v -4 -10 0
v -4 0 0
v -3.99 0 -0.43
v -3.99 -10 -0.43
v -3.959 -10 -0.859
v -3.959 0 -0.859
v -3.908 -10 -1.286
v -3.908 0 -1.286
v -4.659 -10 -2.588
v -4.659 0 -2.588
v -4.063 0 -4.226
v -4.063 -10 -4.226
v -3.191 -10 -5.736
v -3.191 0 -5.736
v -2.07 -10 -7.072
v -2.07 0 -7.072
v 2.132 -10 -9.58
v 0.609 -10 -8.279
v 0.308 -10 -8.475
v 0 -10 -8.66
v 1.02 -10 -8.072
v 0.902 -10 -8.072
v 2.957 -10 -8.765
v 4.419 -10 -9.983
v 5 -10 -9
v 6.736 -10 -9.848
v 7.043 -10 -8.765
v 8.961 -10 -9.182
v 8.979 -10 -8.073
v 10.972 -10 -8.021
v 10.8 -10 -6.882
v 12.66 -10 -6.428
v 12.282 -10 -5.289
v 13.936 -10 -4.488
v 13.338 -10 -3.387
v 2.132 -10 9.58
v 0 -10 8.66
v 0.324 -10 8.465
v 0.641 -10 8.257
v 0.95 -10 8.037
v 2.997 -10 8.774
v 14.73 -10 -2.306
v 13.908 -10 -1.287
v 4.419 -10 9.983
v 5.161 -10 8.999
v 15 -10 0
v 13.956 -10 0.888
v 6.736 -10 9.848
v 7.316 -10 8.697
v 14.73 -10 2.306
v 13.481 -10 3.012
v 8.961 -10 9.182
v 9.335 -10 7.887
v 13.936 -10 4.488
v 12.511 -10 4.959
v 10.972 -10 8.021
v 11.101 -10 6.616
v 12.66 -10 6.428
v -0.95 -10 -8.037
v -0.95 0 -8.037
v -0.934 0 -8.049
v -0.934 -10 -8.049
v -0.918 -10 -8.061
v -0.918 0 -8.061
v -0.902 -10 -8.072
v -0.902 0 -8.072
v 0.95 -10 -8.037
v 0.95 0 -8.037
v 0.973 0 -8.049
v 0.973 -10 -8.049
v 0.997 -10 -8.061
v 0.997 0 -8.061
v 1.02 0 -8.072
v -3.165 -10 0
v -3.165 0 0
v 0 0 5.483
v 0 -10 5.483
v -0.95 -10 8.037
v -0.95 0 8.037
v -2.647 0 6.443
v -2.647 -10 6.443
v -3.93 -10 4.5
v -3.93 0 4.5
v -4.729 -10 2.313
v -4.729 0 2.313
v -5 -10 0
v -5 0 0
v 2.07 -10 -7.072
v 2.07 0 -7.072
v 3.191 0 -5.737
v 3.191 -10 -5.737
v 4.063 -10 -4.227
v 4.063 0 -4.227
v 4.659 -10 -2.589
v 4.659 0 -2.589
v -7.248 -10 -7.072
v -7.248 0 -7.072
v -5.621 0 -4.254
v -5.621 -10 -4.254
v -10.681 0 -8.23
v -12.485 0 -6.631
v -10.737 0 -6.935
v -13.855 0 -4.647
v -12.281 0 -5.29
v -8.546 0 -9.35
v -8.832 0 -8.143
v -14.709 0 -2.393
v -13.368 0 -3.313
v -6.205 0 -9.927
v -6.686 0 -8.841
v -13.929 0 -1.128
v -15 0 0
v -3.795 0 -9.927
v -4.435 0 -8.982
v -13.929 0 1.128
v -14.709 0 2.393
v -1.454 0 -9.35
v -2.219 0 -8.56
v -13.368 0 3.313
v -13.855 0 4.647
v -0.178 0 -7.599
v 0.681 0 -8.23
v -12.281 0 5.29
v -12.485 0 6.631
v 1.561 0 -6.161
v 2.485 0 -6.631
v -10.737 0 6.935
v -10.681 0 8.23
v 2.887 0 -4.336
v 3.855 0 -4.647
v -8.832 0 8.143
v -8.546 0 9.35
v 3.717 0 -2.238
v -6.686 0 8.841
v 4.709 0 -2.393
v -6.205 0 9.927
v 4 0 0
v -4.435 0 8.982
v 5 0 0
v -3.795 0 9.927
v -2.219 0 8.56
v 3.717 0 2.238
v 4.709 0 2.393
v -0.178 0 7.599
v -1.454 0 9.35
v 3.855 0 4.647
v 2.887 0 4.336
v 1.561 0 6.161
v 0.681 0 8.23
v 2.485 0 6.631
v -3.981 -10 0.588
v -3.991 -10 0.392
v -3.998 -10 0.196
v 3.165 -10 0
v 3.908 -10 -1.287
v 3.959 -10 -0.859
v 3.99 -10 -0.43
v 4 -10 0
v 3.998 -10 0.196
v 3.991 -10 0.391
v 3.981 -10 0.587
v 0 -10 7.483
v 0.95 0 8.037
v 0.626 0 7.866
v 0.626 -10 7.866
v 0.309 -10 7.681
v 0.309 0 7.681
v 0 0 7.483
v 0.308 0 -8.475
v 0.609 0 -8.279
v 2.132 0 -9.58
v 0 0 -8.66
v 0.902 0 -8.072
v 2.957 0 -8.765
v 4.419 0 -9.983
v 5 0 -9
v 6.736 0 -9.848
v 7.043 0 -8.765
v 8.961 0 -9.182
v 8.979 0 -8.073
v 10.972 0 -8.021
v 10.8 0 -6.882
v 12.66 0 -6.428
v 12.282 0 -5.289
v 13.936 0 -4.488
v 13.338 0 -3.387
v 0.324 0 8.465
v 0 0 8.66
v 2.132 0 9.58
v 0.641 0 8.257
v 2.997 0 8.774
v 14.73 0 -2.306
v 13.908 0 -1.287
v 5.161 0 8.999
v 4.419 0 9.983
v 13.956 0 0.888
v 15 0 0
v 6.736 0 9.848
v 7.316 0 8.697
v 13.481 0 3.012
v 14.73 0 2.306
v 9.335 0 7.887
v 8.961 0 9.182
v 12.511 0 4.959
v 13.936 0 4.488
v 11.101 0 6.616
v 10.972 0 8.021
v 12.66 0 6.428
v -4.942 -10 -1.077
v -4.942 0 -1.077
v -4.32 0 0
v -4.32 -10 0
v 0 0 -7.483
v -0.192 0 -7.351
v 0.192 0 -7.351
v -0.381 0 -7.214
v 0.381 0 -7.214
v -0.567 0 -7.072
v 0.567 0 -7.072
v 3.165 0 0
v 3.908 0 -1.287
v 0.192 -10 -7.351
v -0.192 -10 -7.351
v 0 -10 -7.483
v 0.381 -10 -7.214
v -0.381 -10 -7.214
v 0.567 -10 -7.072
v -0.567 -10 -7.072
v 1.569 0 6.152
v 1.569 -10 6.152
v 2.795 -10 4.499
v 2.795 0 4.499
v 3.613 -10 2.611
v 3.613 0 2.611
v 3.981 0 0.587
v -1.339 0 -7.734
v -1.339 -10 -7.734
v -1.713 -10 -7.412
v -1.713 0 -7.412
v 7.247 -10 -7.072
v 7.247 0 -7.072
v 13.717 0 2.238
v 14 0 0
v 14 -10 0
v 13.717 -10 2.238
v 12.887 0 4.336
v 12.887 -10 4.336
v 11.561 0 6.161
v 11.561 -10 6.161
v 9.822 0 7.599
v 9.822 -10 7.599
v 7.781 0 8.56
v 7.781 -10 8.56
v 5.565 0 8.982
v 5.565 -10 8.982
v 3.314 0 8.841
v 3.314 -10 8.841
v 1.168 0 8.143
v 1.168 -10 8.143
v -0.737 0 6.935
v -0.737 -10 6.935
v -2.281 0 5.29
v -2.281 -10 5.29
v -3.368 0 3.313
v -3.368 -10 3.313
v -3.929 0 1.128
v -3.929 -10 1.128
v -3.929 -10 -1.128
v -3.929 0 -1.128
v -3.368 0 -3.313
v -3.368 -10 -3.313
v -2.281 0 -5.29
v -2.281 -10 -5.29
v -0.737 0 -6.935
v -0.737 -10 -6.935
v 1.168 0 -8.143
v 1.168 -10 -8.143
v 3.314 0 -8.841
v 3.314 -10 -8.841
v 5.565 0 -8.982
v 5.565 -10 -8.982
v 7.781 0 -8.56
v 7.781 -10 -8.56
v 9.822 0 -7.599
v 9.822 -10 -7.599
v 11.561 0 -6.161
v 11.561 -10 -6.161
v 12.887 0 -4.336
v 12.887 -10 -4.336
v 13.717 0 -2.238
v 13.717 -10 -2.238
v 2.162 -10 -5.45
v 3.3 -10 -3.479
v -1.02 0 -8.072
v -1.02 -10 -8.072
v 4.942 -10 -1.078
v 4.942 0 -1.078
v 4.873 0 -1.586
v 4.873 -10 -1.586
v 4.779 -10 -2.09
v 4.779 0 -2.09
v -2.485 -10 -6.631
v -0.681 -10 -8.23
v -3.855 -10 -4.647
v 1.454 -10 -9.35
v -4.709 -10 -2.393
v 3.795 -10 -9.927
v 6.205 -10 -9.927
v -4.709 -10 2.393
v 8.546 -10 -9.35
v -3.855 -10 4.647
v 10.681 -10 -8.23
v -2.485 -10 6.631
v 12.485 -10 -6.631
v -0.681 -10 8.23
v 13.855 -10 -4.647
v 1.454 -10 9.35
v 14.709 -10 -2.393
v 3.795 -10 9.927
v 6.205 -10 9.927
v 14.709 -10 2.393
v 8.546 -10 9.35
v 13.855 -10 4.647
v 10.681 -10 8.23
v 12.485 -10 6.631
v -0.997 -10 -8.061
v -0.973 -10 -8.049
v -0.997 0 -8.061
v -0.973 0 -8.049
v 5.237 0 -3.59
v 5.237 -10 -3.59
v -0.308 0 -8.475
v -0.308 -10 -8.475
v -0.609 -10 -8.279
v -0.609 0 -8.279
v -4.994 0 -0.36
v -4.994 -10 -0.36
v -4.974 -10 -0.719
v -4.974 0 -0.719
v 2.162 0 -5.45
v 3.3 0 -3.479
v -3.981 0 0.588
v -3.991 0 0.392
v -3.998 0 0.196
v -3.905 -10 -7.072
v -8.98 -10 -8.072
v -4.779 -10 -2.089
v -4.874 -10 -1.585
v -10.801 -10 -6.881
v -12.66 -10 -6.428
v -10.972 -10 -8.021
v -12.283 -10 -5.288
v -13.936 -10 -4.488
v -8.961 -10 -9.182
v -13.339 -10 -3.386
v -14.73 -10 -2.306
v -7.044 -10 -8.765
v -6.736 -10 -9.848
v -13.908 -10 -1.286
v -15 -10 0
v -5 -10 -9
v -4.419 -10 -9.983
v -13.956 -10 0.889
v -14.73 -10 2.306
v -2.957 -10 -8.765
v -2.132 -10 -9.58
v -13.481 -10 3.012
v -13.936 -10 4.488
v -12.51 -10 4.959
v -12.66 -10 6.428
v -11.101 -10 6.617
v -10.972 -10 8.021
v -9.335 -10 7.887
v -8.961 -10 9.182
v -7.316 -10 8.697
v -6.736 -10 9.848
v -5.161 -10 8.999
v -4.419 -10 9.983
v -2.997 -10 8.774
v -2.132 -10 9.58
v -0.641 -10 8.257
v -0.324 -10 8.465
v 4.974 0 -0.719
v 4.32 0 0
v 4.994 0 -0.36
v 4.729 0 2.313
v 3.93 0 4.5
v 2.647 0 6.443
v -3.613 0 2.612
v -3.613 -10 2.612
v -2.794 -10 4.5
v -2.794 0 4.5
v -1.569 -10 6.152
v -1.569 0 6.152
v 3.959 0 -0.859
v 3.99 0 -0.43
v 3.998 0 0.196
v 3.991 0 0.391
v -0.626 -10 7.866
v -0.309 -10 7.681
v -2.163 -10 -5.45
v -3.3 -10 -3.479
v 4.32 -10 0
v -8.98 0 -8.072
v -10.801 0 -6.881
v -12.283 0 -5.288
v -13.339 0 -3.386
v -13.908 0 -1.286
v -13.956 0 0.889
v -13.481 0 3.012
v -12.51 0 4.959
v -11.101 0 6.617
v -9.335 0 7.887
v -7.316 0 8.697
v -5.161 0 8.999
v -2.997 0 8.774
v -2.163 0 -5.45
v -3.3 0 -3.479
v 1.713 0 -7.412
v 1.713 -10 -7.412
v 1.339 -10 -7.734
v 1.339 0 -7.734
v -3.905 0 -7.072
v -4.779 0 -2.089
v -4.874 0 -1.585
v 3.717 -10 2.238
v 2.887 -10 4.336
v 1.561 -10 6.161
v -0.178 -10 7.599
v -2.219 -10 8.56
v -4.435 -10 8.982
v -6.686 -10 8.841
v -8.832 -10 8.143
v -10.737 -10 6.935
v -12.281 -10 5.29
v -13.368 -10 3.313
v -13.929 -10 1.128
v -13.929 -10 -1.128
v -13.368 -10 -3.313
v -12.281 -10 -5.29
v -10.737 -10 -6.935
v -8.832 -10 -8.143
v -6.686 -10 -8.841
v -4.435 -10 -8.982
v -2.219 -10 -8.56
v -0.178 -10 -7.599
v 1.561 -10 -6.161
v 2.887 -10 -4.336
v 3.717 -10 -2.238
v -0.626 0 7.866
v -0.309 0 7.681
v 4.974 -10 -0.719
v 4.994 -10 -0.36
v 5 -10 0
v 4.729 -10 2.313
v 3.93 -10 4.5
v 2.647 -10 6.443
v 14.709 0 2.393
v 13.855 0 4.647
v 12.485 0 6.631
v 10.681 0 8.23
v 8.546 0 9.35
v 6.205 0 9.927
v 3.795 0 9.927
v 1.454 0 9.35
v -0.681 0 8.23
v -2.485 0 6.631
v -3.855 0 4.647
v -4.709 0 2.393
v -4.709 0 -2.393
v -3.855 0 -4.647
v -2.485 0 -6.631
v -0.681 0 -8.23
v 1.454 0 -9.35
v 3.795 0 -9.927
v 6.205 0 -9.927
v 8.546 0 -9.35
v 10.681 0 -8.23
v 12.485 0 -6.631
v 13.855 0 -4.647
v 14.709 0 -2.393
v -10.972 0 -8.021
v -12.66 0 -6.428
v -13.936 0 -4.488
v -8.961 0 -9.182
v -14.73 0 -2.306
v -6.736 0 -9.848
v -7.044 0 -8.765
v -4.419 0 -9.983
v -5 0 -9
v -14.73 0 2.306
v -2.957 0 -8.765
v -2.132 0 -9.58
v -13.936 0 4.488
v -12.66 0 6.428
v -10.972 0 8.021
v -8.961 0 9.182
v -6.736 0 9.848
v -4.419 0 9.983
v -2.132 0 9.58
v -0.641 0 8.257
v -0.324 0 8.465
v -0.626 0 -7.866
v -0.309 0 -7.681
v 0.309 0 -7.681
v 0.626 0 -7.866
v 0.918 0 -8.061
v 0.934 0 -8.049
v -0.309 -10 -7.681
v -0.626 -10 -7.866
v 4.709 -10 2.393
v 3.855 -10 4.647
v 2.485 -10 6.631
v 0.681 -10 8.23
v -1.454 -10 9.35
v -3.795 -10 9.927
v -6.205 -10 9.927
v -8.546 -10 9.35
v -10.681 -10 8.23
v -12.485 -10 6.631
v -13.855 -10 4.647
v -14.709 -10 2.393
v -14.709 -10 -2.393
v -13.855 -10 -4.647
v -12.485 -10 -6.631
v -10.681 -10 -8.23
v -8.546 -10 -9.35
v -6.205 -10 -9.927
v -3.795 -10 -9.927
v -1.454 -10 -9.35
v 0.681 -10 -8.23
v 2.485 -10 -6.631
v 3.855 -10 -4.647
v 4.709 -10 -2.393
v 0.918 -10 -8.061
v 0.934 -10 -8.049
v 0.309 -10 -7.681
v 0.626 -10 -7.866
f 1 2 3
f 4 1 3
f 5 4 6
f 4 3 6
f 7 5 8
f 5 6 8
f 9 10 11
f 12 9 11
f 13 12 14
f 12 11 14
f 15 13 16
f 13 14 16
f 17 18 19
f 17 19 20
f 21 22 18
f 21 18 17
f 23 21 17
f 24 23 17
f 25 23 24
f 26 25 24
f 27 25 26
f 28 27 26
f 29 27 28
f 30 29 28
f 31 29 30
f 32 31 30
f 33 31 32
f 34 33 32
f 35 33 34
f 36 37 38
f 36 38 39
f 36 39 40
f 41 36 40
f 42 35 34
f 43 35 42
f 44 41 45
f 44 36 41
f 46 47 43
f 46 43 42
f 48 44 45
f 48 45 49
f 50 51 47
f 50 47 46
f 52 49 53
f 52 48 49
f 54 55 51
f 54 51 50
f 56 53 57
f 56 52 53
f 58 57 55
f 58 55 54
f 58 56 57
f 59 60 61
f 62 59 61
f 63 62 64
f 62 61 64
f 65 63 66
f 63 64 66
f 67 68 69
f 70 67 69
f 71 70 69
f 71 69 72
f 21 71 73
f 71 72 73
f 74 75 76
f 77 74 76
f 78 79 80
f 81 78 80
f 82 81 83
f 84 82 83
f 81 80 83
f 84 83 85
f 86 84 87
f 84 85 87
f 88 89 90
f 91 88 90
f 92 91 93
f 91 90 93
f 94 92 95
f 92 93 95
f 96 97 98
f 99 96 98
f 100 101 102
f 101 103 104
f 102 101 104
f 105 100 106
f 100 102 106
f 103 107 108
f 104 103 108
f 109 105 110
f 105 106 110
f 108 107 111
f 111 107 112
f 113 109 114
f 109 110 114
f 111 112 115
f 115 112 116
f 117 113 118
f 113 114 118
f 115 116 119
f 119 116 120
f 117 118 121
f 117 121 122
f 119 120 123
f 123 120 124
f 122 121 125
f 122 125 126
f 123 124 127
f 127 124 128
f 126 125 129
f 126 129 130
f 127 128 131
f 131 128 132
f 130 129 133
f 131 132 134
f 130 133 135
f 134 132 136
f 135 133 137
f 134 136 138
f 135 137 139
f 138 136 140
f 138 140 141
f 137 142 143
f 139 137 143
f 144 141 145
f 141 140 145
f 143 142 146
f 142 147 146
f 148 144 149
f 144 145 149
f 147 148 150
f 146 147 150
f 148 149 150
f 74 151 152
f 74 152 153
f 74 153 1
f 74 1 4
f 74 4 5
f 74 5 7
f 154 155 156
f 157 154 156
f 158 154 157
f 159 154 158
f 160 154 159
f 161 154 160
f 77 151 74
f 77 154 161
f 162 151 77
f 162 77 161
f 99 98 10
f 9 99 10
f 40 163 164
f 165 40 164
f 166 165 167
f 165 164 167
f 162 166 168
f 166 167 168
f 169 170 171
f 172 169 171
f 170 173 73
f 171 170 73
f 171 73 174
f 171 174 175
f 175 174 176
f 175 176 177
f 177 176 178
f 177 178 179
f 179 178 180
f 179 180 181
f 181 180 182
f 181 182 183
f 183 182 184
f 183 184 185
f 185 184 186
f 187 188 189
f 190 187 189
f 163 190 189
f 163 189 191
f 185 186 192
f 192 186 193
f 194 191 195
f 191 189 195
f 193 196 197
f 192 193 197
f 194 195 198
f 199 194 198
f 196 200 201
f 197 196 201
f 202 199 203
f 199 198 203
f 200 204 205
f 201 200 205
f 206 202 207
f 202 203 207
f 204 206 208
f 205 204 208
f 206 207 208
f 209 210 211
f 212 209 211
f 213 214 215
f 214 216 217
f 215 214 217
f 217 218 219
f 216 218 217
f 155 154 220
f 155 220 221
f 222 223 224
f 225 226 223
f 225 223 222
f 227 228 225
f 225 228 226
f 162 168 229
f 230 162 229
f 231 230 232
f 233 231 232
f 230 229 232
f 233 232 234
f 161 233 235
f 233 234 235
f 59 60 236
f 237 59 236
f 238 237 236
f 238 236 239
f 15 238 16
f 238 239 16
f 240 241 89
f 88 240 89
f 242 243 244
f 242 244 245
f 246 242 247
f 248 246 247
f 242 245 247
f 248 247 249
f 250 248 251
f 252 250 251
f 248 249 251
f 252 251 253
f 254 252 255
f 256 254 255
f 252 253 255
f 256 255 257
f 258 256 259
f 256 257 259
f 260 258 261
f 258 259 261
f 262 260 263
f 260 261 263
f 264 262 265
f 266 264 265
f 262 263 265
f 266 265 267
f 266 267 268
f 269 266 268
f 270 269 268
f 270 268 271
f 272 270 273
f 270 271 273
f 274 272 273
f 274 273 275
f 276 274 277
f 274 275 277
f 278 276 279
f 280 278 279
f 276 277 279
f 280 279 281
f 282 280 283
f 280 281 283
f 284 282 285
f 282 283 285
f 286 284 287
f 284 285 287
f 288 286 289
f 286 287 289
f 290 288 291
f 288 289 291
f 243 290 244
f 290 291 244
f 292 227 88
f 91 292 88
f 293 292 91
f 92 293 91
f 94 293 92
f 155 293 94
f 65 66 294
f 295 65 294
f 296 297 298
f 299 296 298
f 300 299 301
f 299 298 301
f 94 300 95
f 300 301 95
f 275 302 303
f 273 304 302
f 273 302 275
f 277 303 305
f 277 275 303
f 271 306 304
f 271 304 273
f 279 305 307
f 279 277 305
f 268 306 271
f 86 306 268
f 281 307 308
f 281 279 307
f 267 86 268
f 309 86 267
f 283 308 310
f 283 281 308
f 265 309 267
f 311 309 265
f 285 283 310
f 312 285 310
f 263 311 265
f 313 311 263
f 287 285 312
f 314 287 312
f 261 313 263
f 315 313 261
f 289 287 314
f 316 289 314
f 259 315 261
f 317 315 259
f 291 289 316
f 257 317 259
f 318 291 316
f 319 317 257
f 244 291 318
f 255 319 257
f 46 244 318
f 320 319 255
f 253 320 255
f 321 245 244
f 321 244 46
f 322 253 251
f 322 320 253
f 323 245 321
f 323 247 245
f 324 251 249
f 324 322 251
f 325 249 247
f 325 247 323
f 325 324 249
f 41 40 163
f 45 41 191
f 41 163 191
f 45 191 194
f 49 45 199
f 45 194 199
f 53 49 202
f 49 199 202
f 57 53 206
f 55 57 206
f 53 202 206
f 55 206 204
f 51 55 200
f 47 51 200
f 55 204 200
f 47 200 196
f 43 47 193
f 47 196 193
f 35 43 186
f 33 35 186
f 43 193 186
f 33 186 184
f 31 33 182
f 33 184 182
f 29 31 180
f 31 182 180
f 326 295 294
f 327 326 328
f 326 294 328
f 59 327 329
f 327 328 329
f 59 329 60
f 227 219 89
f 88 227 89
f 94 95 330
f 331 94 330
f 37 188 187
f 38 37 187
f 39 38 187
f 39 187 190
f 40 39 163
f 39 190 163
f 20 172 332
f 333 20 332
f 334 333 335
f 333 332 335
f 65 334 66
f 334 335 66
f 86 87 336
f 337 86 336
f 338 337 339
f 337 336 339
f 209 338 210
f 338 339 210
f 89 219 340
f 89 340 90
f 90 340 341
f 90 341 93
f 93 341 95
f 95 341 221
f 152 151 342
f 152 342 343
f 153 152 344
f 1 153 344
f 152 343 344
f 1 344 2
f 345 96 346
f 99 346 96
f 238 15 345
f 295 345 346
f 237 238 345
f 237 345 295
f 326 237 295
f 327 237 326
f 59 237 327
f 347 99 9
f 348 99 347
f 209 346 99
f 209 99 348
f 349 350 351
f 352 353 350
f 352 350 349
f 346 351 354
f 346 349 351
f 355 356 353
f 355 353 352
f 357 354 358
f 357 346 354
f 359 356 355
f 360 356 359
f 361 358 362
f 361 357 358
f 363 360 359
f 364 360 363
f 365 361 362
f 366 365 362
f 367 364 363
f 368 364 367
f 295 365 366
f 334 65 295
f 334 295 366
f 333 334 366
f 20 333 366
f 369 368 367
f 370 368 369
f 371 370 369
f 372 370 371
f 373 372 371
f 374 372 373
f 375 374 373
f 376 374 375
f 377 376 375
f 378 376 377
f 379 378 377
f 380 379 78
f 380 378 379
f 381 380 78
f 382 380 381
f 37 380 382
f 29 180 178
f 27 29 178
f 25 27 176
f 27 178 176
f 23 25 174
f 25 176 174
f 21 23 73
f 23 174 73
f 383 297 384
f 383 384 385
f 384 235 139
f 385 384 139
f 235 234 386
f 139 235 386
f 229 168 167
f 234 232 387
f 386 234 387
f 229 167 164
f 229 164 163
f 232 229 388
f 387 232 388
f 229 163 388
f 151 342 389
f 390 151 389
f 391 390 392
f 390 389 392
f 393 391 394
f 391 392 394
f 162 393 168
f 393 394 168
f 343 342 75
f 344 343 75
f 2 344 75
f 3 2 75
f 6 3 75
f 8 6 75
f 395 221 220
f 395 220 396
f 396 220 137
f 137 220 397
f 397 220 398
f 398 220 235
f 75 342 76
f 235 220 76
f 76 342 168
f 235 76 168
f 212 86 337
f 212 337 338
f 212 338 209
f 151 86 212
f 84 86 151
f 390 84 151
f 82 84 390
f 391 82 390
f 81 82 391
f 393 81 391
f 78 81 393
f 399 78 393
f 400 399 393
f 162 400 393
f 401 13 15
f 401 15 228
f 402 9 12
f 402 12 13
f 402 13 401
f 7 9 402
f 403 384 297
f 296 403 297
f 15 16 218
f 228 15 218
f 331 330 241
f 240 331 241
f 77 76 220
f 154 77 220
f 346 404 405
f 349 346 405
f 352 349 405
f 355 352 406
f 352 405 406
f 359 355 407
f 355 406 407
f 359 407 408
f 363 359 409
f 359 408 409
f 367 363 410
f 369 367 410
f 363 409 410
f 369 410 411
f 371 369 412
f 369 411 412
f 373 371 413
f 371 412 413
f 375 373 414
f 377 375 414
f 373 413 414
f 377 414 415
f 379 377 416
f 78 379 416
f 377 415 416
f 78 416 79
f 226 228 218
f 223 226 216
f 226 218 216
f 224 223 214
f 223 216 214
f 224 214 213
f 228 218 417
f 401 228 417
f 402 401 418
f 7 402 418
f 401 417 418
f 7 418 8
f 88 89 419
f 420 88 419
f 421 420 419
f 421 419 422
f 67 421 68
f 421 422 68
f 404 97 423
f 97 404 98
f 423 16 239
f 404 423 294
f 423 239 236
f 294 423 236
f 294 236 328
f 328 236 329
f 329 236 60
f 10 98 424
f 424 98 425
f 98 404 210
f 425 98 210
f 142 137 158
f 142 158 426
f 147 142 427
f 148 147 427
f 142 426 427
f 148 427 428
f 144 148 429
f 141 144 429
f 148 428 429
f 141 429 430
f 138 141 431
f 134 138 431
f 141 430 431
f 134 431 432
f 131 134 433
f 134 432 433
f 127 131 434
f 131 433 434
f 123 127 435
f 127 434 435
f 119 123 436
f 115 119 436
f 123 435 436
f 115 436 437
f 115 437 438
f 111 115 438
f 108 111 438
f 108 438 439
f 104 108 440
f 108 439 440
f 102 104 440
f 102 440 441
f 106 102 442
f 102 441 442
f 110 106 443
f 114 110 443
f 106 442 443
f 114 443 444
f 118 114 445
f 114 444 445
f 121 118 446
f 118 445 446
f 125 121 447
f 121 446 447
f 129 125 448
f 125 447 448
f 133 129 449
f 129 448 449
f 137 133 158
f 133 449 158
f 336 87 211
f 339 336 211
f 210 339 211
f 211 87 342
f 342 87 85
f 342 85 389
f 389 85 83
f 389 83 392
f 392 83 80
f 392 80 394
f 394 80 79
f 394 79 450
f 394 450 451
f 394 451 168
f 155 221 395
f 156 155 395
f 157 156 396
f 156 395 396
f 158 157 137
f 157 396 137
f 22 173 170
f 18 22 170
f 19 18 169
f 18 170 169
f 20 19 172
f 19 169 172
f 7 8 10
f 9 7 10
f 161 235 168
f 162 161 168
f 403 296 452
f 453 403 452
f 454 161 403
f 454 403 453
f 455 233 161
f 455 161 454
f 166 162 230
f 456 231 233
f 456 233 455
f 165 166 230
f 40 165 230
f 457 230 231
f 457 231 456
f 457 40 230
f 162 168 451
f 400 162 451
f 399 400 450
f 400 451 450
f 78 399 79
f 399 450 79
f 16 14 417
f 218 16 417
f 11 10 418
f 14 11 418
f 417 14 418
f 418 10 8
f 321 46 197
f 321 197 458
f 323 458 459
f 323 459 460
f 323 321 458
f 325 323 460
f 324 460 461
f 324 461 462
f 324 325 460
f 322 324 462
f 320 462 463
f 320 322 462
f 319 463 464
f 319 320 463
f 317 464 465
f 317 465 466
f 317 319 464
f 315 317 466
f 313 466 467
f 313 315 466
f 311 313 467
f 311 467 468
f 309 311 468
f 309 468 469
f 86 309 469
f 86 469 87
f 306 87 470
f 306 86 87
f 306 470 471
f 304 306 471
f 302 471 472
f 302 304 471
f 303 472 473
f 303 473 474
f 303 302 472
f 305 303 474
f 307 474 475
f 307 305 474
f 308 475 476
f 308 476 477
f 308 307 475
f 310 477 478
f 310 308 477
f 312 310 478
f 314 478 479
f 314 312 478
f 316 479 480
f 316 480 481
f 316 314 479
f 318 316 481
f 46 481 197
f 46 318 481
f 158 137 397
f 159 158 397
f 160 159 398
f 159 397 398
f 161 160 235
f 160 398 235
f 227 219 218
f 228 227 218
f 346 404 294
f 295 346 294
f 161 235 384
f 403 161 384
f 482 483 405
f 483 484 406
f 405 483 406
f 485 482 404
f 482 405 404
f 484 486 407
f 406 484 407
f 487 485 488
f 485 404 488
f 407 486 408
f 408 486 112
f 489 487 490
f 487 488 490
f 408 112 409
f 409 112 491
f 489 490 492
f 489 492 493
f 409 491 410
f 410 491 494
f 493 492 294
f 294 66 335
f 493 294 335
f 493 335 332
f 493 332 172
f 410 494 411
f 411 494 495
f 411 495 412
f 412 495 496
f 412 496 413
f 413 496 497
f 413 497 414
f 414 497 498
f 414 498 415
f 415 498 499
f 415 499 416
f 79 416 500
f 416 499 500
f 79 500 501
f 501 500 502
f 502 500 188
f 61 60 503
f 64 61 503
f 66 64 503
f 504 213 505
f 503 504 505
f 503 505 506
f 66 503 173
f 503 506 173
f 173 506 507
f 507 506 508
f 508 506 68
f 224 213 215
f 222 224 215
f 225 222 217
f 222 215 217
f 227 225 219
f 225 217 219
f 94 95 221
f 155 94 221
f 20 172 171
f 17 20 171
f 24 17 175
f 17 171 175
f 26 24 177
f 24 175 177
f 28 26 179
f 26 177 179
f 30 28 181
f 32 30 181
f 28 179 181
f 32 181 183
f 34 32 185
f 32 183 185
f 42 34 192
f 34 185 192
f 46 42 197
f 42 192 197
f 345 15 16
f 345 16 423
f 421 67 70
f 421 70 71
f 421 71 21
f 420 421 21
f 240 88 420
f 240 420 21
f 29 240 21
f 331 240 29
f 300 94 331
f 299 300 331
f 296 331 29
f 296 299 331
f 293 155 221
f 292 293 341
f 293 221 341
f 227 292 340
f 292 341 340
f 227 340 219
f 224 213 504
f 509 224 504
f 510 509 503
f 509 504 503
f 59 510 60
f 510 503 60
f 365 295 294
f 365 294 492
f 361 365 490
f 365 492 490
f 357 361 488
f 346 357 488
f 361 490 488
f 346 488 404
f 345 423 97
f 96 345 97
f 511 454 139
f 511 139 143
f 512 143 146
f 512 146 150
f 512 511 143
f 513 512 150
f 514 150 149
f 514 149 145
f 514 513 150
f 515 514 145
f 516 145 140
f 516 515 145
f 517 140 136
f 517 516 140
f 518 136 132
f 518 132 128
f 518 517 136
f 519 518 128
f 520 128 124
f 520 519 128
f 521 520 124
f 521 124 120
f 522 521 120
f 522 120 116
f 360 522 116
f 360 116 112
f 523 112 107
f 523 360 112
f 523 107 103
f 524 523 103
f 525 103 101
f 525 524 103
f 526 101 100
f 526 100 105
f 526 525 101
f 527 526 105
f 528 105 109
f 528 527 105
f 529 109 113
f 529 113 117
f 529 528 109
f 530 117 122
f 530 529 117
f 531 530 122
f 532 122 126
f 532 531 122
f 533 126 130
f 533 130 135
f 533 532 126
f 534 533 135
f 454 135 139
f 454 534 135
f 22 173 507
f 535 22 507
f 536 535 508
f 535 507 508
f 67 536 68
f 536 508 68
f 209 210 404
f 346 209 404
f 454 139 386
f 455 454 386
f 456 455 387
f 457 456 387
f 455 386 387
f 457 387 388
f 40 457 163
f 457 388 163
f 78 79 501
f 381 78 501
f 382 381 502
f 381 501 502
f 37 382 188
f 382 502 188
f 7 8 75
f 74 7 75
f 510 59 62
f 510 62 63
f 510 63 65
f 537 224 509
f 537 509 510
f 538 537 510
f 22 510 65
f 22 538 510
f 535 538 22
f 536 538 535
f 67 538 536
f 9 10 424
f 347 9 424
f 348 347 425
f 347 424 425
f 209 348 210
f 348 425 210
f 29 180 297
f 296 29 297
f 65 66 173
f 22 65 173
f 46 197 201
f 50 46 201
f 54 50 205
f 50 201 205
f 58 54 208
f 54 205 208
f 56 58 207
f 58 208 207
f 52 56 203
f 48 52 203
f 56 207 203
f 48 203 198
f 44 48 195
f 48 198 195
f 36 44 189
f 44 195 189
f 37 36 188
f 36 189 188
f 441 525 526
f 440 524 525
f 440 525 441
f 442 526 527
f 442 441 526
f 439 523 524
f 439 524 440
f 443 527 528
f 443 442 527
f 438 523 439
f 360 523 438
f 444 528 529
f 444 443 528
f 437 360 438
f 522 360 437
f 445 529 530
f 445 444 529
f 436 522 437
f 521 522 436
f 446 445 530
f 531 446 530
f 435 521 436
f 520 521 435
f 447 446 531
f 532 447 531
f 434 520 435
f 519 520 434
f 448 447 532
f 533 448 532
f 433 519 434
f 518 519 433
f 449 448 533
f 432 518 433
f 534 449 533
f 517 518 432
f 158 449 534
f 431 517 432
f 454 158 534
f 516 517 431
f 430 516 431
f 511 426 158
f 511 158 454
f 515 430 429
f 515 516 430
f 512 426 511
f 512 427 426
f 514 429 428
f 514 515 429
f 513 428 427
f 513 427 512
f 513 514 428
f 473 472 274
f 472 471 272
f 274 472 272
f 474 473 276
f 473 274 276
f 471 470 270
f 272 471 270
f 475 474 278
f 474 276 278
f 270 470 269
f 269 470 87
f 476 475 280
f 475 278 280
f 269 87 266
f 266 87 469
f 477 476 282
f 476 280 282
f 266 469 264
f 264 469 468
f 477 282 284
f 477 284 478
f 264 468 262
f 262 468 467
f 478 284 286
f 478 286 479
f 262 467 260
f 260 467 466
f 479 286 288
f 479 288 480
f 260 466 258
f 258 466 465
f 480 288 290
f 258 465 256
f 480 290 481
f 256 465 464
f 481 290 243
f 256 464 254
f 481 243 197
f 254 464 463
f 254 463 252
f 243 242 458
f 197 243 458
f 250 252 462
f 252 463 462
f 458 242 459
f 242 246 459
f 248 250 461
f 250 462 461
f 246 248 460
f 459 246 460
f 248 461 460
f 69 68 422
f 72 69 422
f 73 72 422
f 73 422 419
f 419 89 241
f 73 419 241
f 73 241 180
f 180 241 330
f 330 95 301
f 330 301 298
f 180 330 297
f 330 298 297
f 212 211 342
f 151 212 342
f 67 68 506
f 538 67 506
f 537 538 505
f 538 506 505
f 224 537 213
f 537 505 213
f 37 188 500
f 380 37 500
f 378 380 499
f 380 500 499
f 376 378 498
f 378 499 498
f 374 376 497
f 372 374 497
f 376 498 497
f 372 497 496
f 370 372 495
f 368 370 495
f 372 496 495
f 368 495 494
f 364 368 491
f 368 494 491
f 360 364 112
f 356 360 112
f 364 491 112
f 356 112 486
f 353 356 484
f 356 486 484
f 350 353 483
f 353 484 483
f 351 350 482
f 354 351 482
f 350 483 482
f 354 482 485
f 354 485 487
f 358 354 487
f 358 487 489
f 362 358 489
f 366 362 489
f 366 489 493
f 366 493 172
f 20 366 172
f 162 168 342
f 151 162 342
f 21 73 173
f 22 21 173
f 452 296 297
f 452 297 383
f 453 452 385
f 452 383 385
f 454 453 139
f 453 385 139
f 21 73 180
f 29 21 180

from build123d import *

# Parameters (mm, degrees)
F1_DEPTH = 10
F2_R     = 10
F2_R_2   = 9
F3_DEPTH = 10
F4_R     = 10
F4_R_2   = 9
F5_DEPTH = 10


with BuildPart() as f1:
    # F0 (on Front) → F1 (new body)
    with BuildSketch(Plane.XZ):
        with BuildLine():
            ThreePointArc((0, 8.6602540378), (0.4838541491, 8.3622570919), (0.95, 8.0372569948))
            ThreePointArc((0.95, 8.0372569948), (9.7196398168, 7.6632238647), (14, 0))
            ThreePointArc((14, 0), (12.6424014311, -4.7532831144), (8.9791776966, -8.0725550391))
            ThreePointArc((8.9791776966, -8.0725550391), (4.9997397328, -8.9999999962), (1.0203554164, -8.0723248813))
            Line((1.0203554164, -8.0723248813), (0.9023407315, -8.0723214684))
            ThreePointArc((0.9023407315, -8.0723214684), (0.4590909988, -8.3784440958), (0, -8.6602540378))
            ThreePointArc((0, -8.6602540378), (10, -8.6602540378), (15, 0))
            ThreePointArc((15, 0), (10, 8.6602540378), (0, 8.6602540378))
        make_face()
    extrude(amount=F1_DEPTH)


with BuildPart() as f1b:
    # F0 (on Front) → F1, piece 2 (new body)
    with BuildSketch(Plane.XZ):
        with BuildLine():
            ThreePointArc((-8.9802311497, -8.0720356785), (-13.054721878, 4.015153231), (-0.95, 8.0372569948))
            ThreePointArc((-0.95, 8.0372569948), (-0.4838541491, 8.3622570919), (0, 8.6602540378))
            ThreePointArc((0, 8.6602540378), (-15, 0), (0, -8.6602540378))
            ThreePointArc((0, -8.6602540378), (-0.4591280413, -8.3784199602), (-0.9024121095, -8.0722692775))
            Line((-0.9024121095, -8.0722692775), (-1.0202357206, -8.0722658703))
            ThreePointArc((-1.0202357206, -8.0722658703), (-5.0002602672, -8.9999999962), (-8.9802311497, -8.0720356785))
        make_face()
    extrude(amount=F1_DEPTH)


with BuildPart() as f1c:
    # F0 (on Front) → F1, piece 3 (new body)
    with BuildSketch(Plane.XZ):
        with BuildLine():
            Line((-5.6211760394, -4.2536667951), (-4.6593928686, -2.5876880434))
            ThreePointArc((-4.6593928686, -2.5876880434), (-4.8296923359, -1.8377019841), (-4.9418510408, -1.0768462669))
            Line((-4.9418510408, -1.0768462669), (-8.9802311497, -8.0720356785))
            Line((-8.9802311497, -8.0720356785), (-1.0202357206, -8.0722658703))
            ThreePointArc((-1.0202357206, -8.0722658703), (-0.9850797018, -8.0548379871), (-0.95, -8.0372569948))
            ThreePointArc((-0.95, -8.0372569948), (-1.5280203219, -7.5752855178), (-2.0702980916, -7.0718374484))
            Line((-2.0702980916, -7.0718374484), (-3.9045057144, -7.0717844057))
            Line((-3.9045057144, -7.0717844057), (-7.2480984047, -7.0717844057))
            Line((-7.2480984047, -7.0717844057), (-5.6211760394, -4.2536667951))
        make_face()
    extrude(amount=F1_DEPTH)


with BuildPart() as f1d:
    # F0 (on Front) → F1, piece 4 (new body)
    with BuildSketch(Plane.XZ):
        with BuildLine():
            Line((-4, 0), (-3.1654993788, 0))
            Line((-3.1654993788, 0), (-6.52584e-05, 5.4830923897))
            Line((-6.52584e-05, 5.4830923897), (3.1648918599, 0))
            Line((3.1648918599, 0), (4, 0))
            ThreePointArc((4, 0), (3.9952123452, 0.2935214892), (3.9808544745, 0.5867306941))
            Line((3.9808544745, 0.5867306941), (0, 7.4833147735))
            Line((0, 7.4833147735), (-3.9807778283, 0.5879027113))
            ThreePointArc((-3.9807778283, 0.5879027113), (-3.9951931734, 0.2941084365), (-4, 0))
        make_face()
        with BuildLine():
            Line((-3.9077024465, -1.2856271329), (-3.1654993788, 0))
            Line((-3.1654993788, 0), (-4, 0))
            ThreePointArc((-4, 0), (-3.9768959562, -0.6444679905), (-3.9077024465, -1.2856271329))
        make_face()
        with BuildLine():
            Line((4, 0), (3.1648918599, 0))
            Line((3.1648918599, 0), (3.9075585107, -1.2866240234))
            ThreePointArc((3.9075585107, -1.2866240234), (3.9768598796, -0.6449703107), (4, 0))
        make_face()
    extrude(amount=F1_DEPTH)


with BuildPart() as f1e:
    # F0 (on Front) → F1, piece 5 (new body)
    with BuildSketch(Plane.XZ):
        with BuildLine():
            Line((-5, 0), (-4.320178876, 0))
            Line((-4.320178876, 0), (-3.9807778283, 0.5879027113))
            ThreePointArc((-3.9807778283, 0.5879027113), (-2.794370664, 4.4997539879), (0, 7.4833147735))
            ThreePointArc((0, 7.4833147735), (-0.4665313505, 7.7748094513), (-0.95, 8.0372569948))
            ThreePointArc((-0.95, 8.0372569948), (-3.9302855497, 4.5), (-5, 0))
        make_face()
        with BuildLine():
            Line((-4.9418510408, -1.0768462669), (-4.320178876, 0))
            Line((-4.320178876, 0), (-5, 0))
            ThreePointArc((-5, 0), (-4.9854521782, -0.539207563), (-4.9418510408, -1.0768462669))
        make_face()
    extrude(amount=F1_DEPTH)


with BuildPart() as f1f:
    # F0 (on Front) → F1, piece 6 (new body)
    with BuildSketch(Plane.XZ):
        with BuildLine():
            ThreePointArc((0, 7.4833147735), (2.7946642616, 4.4992453867), (3.9808544745, 0.5867306941))
            Line((3.9808544745, 0.5867306941), (4.3195278644, 0))
            Line((4.3195278644, 0), (5, 0))
            ThreePointArc((5, 0), (3.9302855497, 4.5), (0.95, 8.0372569948))
            ThreePointArc((0.95, 8.0372569948), (0.4665313505, 7.7748094513), (0, 7.4833147735))
        make_face()
        with BuildLine():
            Line((5, 0), (4.3195278644, 0))
            Line((4.3195278644, 0), (4.9417333291, -1.0779324713))
            ThreePointArc((4.9417333291, -1.0779324713), (4.9854227074, -0.5397530495), (5, 0))
        make_face()
    extrude(amount=F1_DEPTH)


with BuildPart() as f1g:
    # F0 (on Front) → F1, piece 7 (new body)
    with BuildSketch(Plane.XZ):
        with BuildLine():
            ThreePointArc((-0.5667315474, -7.0718809294), (-2.7940678153, -4.5002785347), (-3.9077024465, -1.2856271329))
            Line((-3.9077024465, -1.2856271329), (-4.6593928686, -2.5876880434))
            ThreePointArc((-4.6593928686, -2.5876880434), (-3.6601119437, -5.0002461062), (-2.0702980916, -7.0718374484))
            Line((-2.0702980916, -7.0718374484), (-0.5667315474, -7.0718809294))
        make_face()
    extrude(amount=F1_DEPTH)


with BuildPart() as f1h:
    # F0 (on Front) → F1, piece 8 (new body)
    with BuildSketch(Plane.XZ):
        with BuildLine():
            Line((4.6591288943, -2.5886732129), (3.9075585107, -1.2866240234))
            ThreePointArc((3.9075585107, -1.2866240234), (2.7938027304, -4.5007376063), (0.5666899079, -7.0719137063))
            Line((0.5666899079, -7.0719137063), (2.0701783268, -7.0719571851))
            ThreePointArc((2.0701783268, -7.0719571851), (3.6598145949, -5.0007610603), (4.6591288943, -2.5886732129))
        make_face()
    extrude(amount=F1_DEPTH)


with BuildPart() as f1i:
    # F0 (on Front) → F1, piece 9 (new body)
    with BuildSketch(Plane.XZ):
        with BuildLine():
            ThreePointArc((4.9417333291, -1.0779324713), (4.829498175, -1.8387402284), (4.6591288943, -2.5886732129))
            Line((4.6591288943, -2.5886732129), (5.2371193526, -3.5900059213))
            Line((5.2371193526, -3.5900059213), (7.2470618219, -7.0721068932))
            Line((7.2470618219, -7.0721068932), (2.0701783268, -7.0719571851))
            ThreePointArc((2.0701783268, -7.0719571851), (1.5279561768, -7.5753407946), (0.95, -8.0372569948))
            ThreePointArc((0.95, -8.0372569948), (0.9851394204, -8.0548677535), (1.0203554164, -8.0723248813))
            Line((1.0203554164, -8.0723248813), (8.9791776966, -8.0725550391))
            Line((8.9791776966, -8.0725550391), (4.9417333291, -1.0779324713))
        make_face()
    extrude(amount=F1_DEPTH)


with BuildPart() as f1j:
    # F0 (on Front) → F1, piece 10 (new body)
    with BuildSketch(Plane.XZ):
        with BuildLine():
            Line((0.5666899079, -7.0719137063), (-0.5667315474, -7.0718809294))
            ThreePointArc((-0.5667315474, -7.0718809294), (-0.2873692278, -7.2831124287), (0, -7.4833147735))
            ThreePointArc((0, -7.4833147735), (0.2873477862, -7.2831279948), (0.5666899079, -7.0719137063))
        make_face()
    extrude(amount=F1_DEPTH)


with BuildPart() as f1k:
    # F0 (on Front) → F1, piece 11 (new body)
    with BuildSketch(Plane.XZ):
        with BuildLine():
            ThreePointArc((0.95, -8.0372569948), (0.4665313505, -7.7748094513), (0, -7.4833147735))
            ThreePointArc((0, -7.4833147735), (-0.4665313505, -7.7748094513), (-0.95, -8.0372569948))
            ThreePointArc((-0.95, -8.0372569948), (-0.9262319115, -8.05479828), (-0.9024121095, -8.0722692775))
            Line((-0.9024121095, -8.0722692775), (0.9023407315, -8.0723214684))
            ThreePointArc((0.9023407315, -8.0723214684), (0.9261962997, -8.0548244808), (0.95, -8.0372569948))
        make_face()
    extrude(amount=F1_DEPTH)


with BuildPart() as f3:
    # F2 (on face) → F3 (new body)
    with BuildSketch(Plane.XZ.offset(10)):
        with Locations((-5, 0)):
            Circle(F2_R)
        with Locations((-5, 0)):
            Circle(F2_R_2, mode=Mode.SUBTRACT)
    extrude(amount=-F3_DEPTH)


with BuildPart() as f5:
    # F4 (on face) → F5 (new body)
    with BuildSketch(Plane.XZ.offset(10)):
        with Locations((5, 0)):
            Circle(F4_R)
        with Locations((5, 0)):
            Circle(F4_R_2, mode=Mode.SUBTRACT)
    extrude(amount=-F5_DEPTH)


solid = Compound([f1.part, f1b.part, f1c.part, f1d.part, f1e.part, f1f.part, f1g.part, f1h.part, f1i.part, f1j.part, f1k.part, f3.part, f5.part])
